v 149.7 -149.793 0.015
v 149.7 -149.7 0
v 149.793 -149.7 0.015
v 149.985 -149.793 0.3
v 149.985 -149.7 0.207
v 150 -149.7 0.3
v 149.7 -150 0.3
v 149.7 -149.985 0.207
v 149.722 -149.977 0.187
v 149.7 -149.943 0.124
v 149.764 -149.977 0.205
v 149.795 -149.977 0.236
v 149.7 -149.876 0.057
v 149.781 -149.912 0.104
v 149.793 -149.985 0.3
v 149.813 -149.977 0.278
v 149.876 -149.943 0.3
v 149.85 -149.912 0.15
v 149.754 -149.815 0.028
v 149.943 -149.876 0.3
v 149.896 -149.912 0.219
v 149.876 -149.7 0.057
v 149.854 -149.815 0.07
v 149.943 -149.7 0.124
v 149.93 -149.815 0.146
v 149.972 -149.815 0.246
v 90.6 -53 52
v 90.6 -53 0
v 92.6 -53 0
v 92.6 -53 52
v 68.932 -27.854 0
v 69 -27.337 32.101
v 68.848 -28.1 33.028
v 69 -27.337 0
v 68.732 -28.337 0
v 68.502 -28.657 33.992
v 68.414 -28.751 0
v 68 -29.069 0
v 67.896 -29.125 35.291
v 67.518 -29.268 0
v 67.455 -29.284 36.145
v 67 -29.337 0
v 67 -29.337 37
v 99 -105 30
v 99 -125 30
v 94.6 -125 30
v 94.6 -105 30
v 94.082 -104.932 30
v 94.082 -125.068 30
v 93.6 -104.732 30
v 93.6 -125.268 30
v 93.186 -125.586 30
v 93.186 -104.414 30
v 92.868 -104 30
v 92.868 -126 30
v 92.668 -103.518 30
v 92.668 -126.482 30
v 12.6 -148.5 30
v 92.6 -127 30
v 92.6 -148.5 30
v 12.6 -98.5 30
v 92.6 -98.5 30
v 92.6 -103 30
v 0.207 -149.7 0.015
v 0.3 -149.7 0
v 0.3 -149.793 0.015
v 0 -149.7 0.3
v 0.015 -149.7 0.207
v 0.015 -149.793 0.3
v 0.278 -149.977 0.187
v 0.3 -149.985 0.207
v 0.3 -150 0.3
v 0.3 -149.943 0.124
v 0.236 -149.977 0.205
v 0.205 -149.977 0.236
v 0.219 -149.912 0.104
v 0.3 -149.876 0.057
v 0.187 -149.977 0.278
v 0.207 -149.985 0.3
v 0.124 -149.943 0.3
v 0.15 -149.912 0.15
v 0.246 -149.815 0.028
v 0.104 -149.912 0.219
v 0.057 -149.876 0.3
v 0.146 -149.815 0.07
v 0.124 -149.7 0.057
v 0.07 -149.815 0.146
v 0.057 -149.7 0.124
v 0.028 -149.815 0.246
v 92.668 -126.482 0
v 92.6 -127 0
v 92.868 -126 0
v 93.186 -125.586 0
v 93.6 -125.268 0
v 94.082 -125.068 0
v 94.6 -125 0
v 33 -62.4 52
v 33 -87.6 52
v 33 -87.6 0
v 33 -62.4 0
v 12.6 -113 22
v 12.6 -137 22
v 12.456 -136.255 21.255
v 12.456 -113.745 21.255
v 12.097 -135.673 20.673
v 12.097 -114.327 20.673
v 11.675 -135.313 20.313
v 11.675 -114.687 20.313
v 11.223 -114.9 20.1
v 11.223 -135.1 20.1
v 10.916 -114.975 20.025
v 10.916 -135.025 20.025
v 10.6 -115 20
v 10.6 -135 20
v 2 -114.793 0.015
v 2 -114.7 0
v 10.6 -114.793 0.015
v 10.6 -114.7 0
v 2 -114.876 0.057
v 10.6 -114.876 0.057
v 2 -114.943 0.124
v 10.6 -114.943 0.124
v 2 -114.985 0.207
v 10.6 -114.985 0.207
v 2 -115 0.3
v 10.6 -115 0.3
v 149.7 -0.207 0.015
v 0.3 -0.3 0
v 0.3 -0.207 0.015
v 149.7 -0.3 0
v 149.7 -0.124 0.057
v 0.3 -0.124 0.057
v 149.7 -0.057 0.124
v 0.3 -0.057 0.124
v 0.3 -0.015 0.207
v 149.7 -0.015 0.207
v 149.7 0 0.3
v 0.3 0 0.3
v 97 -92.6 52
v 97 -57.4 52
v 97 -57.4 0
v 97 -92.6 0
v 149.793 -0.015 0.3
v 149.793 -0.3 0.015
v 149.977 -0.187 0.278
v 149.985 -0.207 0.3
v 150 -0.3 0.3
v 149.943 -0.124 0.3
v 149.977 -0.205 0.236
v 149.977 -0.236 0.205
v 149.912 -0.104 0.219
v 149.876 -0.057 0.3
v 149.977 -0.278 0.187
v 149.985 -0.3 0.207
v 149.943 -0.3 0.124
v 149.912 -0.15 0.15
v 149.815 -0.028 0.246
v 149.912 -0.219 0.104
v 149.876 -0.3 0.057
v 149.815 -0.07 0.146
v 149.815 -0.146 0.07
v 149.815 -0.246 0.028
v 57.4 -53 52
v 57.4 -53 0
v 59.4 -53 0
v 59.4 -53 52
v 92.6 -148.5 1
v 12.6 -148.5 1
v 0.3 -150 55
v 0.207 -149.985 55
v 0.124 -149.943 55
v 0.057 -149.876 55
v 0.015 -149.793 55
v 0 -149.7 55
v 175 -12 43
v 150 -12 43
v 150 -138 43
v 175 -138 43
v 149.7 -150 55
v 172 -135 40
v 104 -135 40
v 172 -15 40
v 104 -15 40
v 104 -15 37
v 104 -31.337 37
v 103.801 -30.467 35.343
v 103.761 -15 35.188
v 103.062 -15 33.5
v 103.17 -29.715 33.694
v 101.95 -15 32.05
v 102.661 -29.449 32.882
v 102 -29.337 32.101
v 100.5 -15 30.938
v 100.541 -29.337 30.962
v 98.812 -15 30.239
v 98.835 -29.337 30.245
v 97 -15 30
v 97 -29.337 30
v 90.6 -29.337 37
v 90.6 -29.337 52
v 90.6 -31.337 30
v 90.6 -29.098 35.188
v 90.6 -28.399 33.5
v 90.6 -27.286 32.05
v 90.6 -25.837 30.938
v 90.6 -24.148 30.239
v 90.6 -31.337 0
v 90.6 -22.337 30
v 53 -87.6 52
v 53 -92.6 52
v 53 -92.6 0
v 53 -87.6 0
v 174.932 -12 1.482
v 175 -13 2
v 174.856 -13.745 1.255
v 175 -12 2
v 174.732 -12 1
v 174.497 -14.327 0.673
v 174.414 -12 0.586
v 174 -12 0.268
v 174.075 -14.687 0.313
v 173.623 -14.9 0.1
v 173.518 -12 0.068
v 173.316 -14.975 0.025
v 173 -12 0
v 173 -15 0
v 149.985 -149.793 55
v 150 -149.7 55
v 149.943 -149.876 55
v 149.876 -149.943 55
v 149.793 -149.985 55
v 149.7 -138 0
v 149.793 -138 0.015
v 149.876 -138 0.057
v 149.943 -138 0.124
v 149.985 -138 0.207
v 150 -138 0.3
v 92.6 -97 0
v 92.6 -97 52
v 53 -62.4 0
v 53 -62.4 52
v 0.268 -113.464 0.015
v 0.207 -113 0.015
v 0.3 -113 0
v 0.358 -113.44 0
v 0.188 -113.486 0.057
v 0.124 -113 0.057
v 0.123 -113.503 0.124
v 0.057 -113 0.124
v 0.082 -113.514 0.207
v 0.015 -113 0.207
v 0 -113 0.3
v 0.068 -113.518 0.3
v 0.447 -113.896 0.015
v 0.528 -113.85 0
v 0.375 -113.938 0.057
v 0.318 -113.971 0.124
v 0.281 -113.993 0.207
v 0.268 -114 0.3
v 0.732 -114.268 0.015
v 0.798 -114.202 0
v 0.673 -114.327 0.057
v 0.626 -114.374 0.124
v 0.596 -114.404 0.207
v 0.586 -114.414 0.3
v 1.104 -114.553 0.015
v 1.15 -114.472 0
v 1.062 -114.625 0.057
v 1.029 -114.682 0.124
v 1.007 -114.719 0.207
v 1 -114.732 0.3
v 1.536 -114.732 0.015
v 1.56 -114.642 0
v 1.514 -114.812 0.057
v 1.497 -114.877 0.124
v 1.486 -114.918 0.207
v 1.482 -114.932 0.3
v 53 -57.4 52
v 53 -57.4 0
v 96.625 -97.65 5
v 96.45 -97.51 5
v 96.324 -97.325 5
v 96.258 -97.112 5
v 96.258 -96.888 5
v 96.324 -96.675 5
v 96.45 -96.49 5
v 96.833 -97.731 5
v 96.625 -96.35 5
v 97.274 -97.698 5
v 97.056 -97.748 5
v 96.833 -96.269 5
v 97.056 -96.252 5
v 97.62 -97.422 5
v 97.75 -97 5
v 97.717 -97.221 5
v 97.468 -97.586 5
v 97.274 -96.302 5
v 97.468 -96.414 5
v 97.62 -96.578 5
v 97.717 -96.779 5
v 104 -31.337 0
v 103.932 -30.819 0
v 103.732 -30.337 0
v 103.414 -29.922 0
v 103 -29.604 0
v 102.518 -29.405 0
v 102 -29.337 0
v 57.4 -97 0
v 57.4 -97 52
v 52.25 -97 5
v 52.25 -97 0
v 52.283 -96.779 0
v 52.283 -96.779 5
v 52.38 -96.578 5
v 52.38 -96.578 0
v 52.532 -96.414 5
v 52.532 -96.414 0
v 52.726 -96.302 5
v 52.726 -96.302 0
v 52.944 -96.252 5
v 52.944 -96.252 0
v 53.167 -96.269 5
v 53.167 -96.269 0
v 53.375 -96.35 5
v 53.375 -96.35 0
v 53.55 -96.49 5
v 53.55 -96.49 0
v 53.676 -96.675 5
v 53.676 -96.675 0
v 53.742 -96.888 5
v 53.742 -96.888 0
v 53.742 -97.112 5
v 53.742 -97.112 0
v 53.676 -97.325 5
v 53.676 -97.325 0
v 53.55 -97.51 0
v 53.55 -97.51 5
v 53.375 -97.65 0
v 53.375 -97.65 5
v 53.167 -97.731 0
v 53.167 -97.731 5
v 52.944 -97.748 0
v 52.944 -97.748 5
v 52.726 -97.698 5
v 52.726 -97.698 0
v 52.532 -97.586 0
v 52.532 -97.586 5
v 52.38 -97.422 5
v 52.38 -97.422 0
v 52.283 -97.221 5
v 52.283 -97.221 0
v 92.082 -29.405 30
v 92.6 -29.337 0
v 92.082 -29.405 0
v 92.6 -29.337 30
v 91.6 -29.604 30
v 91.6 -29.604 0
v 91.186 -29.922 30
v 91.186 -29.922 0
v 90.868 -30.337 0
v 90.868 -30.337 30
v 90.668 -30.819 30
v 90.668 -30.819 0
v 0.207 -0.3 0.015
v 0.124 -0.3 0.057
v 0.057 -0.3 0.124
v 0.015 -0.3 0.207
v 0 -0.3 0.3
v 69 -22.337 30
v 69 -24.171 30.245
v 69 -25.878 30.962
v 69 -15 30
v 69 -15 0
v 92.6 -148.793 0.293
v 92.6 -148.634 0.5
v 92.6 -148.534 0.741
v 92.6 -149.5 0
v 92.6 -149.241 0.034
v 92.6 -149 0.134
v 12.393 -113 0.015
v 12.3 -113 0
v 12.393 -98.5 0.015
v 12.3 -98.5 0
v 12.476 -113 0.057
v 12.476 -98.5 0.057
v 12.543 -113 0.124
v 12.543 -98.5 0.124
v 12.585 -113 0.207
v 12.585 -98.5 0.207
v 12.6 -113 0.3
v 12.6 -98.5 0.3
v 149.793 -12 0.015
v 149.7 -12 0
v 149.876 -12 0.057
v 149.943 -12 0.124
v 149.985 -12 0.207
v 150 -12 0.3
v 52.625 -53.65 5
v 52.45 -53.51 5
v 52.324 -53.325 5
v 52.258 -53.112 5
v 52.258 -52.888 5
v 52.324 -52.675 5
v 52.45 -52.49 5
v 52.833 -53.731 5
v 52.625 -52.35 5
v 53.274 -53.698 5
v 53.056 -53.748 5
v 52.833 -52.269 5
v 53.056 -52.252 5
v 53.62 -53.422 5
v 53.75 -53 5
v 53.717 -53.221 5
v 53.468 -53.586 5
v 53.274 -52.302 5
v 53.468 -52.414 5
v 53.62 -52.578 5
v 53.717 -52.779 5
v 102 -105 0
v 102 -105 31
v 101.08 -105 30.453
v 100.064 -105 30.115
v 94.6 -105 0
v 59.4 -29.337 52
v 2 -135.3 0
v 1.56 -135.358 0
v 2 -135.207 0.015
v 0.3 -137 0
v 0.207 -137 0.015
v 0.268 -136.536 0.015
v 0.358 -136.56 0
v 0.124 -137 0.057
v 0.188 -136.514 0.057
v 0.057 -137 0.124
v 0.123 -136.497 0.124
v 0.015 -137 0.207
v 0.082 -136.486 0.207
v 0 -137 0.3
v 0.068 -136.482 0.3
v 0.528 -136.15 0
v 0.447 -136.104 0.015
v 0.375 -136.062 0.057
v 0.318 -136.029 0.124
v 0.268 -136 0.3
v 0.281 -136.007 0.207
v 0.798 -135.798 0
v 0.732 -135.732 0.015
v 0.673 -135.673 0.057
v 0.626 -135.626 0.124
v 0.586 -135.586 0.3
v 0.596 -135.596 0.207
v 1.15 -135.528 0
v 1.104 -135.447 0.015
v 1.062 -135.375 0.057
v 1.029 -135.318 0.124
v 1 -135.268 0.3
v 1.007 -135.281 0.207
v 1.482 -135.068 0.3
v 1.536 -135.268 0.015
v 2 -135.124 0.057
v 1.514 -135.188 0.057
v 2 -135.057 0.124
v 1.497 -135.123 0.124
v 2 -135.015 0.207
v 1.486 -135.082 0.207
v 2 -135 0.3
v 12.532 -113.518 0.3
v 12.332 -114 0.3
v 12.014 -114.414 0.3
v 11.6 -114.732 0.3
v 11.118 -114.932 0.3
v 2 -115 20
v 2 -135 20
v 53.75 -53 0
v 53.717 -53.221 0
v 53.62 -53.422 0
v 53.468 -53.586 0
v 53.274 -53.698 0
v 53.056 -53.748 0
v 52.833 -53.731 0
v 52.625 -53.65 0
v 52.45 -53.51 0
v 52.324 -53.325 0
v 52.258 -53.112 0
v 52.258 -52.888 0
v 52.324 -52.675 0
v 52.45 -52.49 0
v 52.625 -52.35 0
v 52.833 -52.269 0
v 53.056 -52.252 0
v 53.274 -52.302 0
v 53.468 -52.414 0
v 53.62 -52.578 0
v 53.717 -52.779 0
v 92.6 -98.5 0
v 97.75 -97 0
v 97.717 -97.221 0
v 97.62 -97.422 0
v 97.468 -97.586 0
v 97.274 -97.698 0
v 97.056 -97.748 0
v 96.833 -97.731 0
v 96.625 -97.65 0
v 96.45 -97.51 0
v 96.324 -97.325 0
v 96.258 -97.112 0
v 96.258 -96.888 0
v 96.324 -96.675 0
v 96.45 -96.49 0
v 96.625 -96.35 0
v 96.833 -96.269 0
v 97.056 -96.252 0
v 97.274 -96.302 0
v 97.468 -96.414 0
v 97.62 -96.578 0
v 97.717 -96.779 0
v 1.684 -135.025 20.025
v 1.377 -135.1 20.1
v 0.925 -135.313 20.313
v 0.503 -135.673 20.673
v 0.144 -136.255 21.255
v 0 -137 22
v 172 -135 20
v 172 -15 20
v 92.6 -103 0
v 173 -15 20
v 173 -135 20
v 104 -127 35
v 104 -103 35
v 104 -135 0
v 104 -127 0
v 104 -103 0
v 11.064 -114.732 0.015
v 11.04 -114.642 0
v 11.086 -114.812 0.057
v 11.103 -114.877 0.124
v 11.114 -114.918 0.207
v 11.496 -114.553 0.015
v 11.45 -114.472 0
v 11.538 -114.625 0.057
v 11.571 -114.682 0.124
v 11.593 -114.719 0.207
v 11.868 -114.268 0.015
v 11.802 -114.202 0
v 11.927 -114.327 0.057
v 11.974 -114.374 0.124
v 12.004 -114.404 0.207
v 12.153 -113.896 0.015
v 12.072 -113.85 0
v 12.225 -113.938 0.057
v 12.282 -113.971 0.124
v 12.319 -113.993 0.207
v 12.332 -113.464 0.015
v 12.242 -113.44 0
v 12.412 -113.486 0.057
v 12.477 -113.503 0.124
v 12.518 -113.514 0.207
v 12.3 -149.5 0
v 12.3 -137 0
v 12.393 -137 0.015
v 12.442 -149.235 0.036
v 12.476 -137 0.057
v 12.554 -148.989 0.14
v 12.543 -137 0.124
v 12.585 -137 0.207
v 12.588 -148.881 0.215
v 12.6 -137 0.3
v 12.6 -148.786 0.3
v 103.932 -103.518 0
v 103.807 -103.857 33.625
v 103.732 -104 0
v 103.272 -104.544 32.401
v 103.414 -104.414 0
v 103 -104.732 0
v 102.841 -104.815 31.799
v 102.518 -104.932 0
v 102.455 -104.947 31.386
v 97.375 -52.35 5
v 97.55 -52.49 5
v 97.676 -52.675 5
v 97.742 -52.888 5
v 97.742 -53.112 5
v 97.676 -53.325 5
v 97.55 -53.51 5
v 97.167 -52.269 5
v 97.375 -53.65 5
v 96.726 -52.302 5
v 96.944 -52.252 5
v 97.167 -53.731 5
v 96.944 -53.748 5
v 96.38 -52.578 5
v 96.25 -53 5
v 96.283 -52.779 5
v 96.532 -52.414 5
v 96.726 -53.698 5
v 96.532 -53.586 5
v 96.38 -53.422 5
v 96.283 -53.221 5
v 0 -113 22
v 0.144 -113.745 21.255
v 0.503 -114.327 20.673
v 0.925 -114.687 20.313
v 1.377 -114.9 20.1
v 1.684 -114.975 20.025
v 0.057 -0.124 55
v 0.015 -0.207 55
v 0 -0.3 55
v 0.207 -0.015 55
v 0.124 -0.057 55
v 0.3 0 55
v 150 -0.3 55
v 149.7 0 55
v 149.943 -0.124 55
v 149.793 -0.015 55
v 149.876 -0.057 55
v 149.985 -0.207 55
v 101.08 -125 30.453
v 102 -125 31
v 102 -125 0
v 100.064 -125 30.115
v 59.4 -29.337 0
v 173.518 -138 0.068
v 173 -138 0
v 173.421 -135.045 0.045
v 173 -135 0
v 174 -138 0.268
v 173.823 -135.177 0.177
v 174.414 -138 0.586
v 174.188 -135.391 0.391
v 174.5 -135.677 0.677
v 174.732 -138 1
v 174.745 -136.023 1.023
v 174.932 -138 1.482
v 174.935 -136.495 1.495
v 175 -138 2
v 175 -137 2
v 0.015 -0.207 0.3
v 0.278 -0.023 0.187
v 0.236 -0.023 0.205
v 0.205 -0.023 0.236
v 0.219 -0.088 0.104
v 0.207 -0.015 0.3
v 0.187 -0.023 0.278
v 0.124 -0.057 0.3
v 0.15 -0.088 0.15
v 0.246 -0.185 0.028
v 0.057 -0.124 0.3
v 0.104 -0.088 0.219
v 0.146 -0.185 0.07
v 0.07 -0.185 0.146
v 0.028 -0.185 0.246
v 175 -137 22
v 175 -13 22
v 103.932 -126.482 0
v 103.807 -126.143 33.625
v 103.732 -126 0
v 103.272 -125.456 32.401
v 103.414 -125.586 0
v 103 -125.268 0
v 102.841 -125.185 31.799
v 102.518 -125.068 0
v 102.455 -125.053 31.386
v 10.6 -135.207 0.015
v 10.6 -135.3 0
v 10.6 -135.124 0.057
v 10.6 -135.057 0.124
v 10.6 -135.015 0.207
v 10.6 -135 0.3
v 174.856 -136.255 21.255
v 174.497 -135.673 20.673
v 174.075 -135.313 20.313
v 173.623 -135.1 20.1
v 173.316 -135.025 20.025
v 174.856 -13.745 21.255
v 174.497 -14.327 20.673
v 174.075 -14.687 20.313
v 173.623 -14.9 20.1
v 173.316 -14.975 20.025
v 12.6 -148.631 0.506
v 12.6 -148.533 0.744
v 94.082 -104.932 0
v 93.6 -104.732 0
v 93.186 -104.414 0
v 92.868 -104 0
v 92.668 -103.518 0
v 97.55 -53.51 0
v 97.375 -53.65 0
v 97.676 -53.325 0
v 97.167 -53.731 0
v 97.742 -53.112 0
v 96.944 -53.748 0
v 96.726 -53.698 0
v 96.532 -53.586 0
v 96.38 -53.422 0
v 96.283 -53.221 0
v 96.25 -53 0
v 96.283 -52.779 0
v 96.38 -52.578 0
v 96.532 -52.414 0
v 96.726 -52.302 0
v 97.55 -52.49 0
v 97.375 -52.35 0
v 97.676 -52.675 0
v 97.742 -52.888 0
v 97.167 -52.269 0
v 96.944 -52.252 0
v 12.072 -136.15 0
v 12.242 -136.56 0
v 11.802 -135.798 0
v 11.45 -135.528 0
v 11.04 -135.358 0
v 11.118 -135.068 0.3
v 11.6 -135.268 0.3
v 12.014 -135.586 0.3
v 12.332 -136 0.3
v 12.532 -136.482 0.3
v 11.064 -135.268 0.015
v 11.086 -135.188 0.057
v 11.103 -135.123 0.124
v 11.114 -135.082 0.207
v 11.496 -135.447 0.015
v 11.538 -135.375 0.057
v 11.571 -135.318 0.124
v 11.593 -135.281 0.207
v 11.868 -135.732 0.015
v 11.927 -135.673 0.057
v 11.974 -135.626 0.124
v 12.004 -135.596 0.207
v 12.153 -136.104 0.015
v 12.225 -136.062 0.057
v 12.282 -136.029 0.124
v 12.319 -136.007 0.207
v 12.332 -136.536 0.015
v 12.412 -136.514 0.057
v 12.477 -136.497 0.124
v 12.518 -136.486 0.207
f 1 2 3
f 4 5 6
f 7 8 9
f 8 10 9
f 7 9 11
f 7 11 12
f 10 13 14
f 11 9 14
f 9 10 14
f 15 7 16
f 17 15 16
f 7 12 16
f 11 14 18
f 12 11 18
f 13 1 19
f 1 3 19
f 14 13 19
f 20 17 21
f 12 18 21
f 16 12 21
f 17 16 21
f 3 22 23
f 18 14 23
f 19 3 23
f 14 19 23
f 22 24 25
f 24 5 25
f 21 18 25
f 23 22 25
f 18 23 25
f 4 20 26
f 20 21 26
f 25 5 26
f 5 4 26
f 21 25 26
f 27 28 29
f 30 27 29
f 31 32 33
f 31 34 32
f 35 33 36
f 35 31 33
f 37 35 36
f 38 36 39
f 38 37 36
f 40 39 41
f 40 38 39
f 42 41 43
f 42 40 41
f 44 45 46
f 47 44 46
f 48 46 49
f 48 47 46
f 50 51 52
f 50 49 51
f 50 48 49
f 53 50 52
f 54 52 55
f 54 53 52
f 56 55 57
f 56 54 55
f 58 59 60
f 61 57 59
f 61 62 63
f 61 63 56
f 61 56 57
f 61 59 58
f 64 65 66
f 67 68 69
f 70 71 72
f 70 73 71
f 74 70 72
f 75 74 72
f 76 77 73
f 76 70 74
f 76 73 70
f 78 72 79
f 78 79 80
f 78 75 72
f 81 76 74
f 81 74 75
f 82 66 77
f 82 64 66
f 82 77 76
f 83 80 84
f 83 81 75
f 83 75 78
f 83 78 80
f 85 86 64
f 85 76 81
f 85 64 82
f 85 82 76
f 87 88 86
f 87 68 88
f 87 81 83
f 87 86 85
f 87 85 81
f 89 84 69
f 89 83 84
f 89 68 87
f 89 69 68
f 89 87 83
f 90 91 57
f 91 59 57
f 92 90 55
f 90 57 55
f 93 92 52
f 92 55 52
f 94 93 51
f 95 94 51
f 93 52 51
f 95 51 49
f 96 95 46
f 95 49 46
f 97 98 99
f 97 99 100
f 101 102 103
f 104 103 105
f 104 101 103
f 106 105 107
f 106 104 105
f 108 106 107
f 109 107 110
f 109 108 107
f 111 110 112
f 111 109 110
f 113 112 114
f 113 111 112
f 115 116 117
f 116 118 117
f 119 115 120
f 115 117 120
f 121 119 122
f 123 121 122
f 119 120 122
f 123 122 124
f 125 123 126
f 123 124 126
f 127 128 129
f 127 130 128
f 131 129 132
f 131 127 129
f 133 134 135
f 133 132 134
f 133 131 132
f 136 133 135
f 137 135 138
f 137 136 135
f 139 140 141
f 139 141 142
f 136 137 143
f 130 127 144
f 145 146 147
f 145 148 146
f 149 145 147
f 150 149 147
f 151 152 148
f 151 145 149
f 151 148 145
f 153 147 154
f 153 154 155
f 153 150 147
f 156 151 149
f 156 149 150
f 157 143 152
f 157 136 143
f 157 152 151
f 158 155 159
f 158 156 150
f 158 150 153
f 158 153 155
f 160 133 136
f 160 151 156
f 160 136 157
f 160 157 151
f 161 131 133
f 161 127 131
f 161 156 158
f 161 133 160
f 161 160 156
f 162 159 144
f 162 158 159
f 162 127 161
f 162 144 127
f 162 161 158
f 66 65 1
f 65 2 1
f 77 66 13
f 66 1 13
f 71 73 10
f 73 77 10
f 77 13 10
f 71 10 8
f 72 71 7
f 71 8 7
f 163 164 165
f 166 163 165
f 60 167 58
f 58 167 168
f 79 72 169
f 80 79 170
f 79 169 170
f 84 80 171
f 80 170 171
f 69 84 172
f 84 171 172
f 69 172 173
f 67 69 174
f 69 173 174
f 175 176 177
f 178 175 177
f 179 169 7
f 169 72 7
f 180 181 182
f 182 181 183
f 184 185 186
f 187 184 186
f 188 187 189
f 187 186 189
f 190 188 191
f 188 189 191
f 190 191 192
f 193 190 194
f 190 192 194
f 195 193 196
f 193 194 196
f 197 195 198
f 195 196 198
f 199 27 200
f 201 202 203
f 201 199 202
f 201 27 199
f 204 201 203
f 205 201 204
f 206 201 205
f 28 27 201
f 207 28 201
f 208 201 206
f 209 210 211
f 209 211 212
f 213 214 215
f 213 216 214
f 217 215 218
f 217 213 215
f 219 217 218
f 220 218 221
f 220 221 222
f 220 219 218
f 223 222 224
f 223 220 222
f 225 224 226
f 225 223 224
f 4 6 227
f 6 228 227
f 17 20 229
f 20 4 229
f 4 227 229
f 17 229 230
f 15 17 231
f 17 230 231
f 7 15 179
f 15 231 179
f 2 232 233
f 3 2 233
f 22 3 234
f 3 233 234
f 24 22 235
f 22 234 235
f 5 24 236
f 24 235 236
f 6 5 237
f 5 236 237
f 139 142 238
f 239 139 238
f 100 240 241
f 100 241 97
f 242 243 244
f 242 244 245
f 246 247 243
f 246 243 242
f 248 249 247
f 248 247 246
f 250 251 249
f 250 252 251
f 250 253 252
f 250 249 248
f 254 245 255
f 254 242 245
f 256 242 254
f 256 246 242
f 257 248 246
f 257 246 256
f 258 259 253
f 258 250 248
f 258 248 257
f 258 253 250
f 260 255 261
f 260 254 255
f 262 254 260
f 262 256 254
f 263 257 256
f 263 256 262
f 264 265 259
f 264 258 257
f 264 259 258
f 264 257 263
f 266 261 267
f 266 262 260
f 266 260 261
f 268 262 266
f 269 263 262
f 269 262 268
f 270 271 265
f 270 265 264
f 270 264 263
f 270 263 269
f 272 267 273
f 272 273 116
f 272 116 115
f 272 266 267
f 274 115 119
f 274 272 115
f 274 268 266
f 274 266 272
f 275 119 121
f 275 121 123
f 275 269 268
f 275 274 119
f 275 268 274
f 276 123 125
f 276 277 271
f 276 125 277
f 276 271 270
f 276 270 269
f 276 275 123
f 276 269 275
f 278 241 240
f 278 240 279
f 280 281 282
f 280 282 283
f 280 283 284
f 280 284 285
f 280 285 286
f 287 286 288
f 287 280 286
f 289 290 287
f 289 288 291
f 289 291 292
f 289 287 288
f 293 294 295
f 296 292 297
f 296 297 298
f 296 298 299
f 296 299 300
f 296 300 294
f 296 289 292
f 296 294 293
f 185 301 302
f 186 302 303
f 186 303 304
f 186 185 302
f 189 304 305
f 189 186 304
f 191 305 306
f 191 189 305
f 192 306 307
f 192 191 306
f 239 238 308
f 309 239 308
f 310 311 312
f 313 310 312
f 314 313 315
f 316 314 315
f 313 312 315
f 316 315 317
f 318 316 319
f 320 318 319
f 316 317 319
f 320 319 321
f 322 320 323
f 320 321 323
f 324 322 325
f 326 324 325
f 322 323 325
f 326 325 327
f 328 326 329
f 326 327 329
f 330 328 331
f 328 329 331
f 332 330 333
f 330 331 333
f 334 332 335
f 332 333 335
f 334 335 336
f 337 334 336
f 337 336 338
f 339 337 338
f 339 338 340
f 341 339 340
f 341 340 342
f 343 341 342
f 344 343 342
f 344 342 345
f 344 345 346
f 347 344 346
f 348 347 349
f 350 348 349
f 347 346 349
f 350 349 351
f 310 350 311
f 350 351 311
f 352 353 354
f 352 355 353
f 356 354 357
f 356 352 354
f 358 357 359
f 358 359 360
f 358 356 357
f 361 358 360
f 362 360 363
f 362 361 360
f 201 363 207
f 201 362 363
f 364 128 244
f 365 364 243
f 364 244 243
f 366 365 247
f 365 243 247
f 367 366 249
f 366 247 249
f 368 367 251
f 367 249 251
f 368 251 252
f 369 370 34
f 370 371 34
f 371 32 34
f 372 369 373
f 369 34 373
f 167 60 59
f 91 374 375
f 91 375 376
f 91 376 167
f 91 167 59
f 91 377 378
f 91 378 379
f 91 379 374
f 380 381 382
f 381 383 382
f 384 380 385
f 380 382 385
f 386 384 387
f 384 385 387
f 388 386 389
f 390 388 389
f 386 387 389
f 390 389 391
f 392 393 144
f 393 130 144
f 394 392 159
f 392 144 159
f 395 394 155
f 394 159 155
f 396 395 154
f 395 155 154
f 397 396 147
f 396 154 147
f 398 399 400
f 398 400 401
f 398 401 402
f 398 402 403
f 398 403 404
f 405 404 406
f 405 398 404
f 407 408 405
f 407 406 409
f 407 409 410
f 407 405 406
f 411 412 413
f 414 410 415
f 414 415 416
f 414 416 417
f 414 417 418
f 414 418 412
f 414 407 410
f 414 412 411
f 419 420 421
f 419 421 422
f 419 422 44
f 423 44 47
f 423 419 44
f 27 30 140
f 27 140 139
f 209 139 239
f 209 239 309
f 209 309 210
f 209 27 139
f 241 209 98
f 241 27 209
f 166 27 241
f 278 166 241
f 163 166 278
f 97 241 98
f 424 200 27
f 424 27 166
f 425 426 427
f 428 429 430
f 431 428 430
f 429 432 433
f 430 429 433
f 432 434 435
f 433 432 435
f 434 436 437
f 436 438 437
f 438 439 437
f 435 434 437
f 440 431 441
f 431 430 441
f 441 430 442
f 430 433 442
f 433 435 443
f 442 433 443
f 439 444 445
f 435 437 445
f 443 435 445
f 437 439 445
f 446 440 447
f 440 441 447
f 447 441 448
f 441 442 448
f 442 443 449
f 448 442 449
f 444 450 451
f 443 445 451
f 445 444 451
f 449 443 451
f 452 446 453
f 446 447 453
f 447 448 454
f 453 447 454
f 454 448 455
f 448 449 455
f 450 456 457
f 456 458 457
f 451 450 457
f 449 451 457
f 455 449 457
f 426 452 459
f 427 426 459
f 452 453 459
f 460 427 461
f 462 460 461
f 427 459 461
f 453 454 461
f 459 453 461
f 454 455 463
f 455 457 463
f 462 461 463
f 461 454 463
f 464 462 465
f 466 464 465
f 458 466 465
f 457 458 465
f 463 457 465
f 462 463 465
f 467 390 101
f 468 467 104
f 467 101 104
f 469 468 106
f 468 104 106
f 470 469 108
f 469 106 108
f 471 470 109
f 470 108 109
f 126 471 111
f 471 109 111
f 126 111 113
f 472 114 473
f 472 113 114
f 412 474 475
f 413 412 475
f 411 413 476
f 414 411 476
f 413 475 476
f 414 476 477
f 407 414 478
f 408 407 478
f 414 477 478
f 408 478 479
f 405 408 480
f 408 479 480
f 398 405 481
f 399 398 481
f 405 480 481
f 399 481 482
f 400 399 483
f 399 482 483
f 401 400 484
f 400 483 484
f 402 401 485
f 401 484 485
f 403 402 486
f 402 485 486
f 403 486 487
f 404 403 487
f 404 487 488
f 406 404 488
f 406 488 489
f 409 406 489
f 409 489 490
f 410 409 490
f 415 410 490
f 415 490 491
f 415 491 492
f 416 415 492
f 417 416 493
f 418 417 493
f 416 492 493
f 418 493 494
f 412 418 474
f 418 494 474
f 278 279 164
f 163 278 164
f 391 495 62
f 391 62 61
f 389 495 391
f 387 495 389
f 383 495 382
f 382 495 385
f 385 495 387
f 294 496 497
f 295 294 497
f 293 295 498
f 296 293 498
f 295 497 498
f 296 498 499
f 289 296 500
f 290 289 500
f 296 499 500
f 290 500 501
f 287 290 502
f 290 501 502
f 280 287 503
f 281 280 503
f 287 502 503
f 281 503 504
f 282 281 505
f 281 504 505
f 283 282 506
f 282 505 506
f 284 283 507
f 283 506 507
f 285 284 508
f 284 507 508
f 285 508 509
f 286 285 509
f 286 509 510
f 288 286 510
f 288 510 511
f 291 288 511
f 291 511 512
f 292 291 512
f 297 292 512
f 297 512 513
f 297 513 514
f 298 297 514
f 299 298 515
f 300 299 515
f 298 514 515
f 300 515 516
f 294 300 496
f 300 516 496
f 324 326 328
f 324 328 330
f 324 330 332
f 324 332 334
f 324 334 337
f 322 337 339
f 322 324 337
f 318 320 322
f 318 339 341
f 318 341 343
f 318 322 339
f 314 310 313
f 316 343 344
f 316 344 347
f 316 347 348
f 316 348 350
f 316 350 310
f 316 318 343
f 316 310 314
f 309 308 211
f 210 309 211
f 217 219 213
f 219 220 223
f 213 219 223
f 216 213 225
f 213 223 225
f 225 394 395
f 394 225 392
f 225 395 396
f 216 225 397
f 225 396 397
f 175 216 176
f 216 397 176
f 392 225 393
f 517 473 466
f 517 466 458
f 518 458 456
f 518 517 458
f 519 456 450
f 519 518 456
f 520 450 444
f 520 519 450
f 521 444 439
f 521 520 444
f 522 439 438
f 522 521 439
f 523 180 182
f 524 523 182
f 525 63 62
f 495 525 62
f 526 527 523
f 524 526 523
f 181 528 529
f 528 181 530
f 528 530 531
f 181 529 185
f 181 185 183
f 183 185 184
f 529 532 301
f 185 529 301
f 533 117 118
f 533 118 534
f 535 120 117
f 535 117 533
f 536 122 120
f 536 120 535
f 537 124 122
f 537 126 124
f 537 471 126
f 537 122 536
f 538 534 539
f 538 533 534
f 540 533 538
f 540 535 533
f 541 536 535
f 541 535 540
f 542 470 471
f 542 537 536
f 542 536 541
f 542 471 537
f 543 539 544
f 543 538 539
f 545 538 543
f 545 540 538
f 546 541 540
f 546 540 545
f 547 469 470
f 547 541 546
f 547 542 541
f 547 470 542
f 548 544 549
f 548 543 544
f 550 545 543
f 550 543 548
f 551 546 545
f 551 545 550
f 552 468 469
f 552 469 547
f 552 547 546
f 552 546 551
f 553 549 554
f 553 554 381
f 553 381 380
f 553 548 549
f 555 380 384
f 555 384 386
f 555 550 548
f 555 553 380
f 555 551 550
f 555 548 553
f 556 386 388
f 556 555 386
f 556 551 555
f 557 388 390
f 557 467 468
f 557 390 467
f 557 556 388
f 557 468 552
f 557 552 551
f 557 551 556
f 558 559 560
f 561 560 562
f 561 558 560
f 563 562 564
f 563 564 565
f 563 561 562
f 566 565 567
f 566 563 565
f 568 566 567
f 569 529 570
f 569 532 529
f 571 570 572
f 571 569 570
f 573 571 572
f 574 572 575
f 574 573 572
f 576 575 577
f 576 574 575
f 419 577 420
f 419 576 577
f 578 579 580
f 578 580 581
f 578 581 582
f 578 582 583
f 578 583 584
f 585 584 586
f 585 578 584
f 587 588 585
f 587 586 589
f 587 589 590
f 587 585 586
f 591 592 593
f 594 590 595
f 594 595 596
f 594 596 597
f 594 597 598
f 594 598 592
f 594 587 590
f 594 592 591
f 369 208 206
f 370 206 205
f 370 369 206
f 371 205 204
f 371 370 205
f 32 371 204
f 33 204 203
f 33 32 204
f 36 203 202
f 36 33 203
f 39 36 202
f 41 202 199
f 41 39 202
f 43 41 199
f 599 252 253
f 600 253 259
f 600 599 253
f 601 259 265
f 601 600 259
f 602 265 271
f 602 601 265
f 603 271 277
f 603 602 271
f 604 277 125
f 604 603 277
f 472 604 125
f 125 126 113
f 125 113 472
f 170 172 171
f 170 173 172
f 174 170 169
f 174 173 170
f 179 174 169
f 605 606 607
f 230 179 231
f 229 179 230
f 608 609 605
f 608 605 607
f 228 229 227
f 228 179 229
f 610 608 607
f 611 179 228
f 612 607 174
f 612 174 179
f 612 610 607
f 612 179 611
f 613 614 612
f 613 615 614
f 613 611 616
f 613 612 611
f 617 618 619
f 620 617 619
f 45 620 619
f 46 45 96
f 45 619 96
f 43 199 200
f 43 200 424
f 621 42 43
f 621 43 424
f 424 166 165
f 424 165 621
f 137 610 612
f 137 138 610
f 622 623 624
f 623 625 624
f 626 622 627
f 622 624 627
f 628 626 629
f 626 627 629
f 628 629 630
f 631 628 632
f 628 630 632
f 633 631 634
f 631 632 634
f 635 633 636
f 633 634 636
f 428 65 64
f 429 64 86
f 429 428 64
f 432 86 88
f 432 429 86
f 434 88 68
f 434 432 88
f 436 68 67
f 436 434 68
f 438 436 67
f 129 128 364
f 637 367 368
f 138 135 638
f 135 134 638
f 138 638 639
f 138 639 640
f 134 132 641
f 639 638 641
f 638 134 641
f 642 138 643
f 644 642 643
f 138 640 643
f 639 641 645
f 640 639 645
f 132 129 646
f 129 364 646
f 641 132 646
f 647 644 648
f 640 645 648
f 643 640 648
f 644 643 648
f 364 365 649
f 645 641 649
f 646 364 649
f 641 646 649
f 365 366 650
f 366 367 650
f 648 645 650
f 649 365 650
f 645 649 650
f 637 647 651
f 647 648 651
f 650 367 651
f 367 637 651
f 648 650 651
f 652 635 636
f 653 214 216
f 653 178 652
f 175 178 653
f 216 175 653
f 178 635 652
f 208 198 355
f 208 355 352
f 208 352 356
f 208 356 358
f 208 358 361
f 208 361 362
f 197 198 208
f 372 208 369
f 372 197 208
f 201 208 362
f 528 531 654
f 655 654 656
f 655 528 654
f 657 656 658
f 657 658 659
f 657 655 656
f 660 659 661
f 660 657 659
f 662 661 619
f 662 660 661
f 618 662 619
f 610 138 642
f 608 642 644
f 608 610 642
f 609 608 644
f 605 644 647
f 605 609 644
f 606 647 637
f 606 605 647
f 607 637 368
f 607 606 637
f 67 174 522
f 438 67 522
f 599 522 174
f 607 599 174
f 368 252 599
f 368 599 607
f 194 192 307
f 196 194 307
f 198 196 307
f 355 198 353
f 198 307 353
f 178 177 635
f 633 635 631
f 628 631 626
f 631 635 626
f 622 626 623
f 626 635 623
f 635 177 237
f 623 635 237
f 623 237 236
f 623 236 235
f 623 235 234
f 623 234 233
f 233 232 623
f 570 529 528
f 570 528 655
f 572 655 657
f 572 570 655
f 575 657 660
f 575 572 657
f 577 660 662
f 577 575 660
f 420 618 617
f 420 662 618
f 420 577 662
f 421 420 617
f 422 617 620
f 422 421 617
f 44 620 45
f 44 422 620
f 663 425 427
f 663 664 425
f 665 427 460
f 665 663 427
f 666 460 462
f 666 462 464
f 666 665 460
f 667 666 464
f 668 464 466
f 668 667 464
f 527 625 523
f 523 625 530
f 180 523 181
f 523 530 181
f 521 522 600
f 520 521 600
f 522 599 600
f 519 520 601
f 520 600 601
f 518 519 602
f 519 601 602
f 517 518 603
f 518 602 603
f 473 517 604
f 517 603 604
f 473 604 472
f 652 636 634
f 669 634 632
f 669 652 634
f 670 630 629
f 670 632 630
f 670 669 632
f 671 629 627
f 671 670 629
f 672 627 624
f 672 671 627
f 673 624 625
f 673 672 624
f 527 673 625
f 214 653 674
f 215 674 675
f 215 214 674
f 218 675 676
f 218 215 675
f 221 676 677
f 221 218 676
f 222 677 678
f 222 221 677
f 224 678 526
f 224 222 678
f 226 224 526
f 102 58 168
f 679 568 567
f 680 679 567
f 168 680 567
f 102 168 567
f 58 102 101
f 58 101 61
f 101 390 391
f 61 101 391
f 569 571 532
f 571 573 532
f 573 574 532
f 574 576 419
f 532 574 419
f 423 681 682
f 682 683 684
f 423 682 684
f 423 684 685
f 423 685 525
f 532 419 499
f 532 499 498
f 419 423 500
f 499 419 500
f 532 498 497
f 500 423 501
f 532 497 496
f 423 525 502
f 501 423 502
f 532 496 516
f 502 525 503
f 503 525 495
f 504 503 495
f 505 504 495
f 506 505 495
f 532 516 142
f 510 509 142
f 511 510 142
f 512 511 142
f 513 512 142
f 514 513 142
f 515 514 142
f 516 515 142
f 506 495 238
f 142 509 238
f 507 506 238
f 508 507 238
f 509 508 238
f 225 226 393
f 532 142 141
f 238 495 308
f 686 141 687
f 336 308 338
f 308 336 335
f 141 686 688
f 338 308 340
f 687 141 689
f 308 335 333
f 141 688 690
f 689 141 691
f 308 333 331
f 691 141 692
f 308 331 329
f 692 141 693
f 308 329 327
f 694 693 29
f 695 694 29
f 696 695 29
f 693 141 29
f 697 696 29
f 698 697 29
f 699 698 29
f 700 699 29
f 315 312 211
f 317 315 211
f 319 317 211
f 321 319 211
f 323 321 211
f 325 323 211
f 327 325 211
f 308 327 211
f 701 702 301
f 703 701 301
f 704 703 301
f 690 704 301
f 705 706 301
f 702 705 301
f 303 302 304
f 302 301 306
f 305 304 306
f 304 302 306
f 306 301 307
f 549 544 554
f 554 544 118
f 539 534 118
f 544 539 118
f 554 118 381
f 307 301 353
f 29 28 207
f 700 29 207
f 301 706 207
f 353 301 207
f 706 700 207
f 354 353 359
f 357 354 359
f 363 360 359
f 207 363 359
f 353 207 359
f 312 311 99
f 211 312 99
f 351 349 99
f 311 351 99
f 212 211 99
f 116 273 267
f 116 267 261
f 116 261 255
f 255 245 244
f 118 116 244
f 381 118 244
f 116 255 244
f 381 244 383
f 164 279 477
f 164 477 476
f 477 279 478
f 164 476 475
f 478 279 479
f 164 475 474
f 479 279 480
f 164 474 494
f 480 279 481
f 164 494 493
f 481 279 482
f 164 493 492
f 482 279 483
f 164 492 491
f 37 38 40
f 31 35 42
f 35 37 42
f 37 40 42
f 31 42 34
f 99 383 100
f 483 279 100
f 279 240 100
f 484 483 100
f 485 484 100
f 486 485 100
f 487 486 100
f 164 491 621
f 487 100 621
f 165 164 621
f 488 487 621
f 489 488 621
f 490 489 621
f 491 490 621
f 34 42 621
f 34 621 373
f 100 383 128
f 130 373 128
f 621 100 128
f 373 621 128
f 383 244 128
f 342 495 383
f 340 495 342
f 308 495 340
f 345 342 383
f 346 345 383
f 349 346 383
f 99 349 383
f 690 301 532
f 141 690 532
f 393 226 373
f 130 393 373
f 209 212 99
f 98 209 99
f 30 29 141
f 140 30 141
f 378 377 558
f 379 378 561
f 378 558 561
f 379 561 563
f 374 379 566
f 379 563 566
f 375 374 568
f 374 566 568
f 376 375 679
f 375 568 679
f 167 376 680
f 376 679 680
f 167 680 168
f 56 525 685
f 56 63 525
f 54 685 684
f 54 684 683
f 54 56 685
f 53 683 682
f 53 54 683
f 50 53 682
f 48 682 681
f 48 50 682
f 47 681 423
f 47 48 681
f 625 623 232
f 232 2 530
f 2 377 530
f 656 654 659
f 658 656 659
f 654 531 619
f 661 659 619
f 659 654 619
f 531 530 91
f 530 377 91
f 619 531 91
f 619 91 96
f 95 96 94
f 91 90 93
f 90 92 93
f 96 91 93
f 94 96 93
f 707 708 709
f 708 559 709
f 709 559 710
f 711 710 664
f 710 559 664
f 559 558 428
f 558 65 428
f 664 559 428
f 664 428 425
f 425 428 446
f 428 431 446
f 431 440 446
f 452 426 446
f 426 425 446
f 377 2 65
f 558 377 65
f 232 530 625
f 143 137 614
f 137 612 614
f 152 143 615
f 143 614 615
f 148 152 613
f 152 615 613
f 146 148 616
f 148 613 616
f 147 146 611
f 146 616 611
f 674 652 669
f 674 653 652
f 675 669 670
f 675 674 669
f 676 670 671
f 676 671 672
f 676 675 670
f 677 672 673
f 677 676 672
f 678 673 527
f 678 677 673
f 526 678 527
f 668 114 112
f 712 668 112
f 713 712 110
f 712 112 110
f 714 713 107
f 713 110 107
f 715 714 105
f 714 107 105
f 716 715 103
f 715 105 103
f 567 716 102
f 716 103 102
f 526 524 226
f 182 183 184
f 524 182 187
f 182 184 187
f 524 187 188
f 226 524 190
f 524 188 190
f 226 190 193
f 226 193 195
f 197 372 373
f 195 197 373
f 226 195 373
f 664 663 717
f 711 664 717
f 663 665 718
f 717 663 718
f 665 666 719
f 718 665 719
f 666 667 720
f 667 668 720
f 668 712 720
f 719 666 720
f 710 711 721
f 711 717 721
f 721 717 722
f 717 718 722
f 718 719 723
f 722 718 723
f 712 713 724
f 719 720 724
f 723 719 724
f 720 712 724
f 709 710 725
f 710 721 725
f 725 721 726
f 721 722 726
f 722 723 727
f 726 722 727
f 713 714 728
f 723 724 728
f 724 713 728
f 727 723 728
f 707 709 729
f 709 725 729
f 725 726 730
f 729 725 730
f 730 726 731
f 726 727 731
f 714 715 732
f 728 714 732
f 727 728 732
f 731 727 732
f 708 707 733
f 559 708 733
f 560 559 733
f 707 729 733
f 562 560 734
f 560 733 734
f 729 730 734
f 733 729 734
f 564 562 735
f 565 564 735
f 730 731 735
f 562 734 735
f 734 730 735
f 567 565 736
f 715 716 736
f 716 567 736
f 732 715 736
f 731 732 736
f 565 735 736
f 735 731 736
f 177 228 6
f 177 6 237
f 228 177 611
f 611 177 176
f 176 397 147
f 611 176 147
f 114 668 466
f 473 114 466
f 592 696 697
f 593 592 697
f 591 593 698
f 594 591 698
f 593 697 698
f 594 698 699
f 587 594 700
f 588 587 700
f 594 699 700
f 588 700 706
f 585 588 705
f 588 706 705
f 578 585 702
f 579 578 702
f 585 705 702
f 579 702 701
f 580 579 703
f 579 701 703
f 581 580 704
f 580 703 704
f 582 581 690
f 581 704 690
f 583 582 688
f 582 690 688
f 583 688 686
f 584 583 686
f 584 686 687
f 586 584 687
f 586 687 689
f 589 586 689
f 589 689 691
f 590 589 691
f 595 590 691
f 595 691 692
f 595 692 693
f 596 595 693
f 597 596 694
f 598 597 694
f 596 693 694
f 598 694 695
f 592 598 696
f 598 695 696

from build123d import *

# Parameters (mm, degrees)
SKETCH_1_W           = 150
SKETCH_1_H           = 150
EXTRUDE_2_DEPTH      = 55
CUT_EXTRUDE_1_DEPTH  = 52
SKETCH_3_W           = 20
SKETCH_3_H           = 25.2
CUT_EXTRUDE_2_DEPTH  = 52
SKETCH_4_W           = 31.2
SKETCH_4_H           = 23.663491794
CUT_EXTRUDE_3_DEPTH  = 52
SKETCH_5_W           = 46
SKETCH_5_H           = 120
SKETCH_5_W_2         = 29
CUT_EXTRUDE_4_DEPTH  = 40
SKETCH_6_W           = 3
SKETCH_6_H           = 120
EXTRUDE_4_DEPTH      = 25
SKETCH_7_W           = 3
SKETCH_7_H           = 120
EXTRUDE_5_DEPTH      = 20
CUT_EXTRUDE_6_DEPTH  = 30
FILLET_1_R           = 7
SKETCH_10_W          = 80
SKETCH_10_H          = 50
CUT_EXTRUDE_7_DEPTH  = 30
SKETCH_11_W          = 11.4
SKETCH_11_H          = 20
CUT_EXTRUDE_8_DEPTH  = 30
FILLET_2_R           = 5
FILLET_3_R           = 2
SKETCH_12_W          = 12.6
SKETCH_12_H          = 20
CUT_EXTRUDE_9_DEPTH  = 20
FILLET_4_R           = 2
SKETCH_13_R          = 0.75
CUT_EXTRUDE_10_DEPTH = 5
FILLET_5_R           = 2
FILLET_6_R           = 1
FILLET_8_R           = 0.3


with BuildPart() as part:
    # 草图1 → 凸台-拉伸2 (new body)
    with BuildSketch(Plane.XY):
        with Locations((75, -75)):
            Rectangle(SKETCH_1_W, SKETCH_1_H)
    extrude(amount=EXTRUDE_2_DEPTH)

    # 草图2 → 切除-拉伸1 (cut)
    with BuildSketch(Plane(origin=(0, 0, 0), x_dir=(-1, 0, 0), z_dir=(0, 0, -1))):
        Polygon((-57.4, -53), (-92.6, -53), (-97, -57.4), (-97, -92.6), (-92.6, -97), (-57.4, -97), (-53, -92.6), (-53, -57.4), align=None)
    extrude(amount=-CUT_EXTRUDE_1_DEPTH, mode=Mode.SUBTRACT)

    # 草图3 → 切除-拉伸2 (cut)
    with BuildSketch(Plane(origin=(0, 0, 0), x_dir=(-1, 0, 0), z_dir=(0, 0, -1))):
        with Locations((-43, -75)):
            Rectangle(SKETCH_3_W, SKETCH_3_H)
    extrude(amount=-CUT_EXTRUDE_2_DEPTH, mode=Mode.SUBTRACT)

    # 草图4 → 切除-拉伸3 (cut)
    with BuildSketch(Plane(origin=(0, 0, 0), x_dir=(-1, 0, 0), z_dir=(0, 0, -1))):
        with Locations((-75, -41.168254103)):
            Rectangle(SKETCH_4_W, SKETCH_4_H)
    extrude(amount=-CUT_EXTRUDE_3_DEPTH, mode=Mode.SUBTRACT)

    # 草图5 → 切除-拉伸4 (cut)
    with BuildSketch(Plane(origin=(0, 0, 0), x_dir=(-1, 0, 0), z_dir=(0, 0, -1))):
        with Locations((-127, -75)):
            Rectangle(SKETCH_5_W, SKETCH_5_H)
        with Locations((-164.5, -75)):
            Rectangle(SKETCH_5_W_2, SKETCH_5_H)
    extrude(amount=-CUT_EXTRUDE_4_DEPTH, mode=Mode.SUBTRACT)

    # 草图6 → 凸台-拉伸4 (add)
    with BuildSketch(Plane(origin=(150, 0, 0), x_dir=(0, 0, -1), z_dir=(1, 0, 0))):
        Polygon((-43, -15), (-40, -15), (0, -15), (0, -12), (-43, -12), align=None)
        with Locations((-41.5, -75)):
            Rectangle(SKETCH_6_W, SKETCH_6_H)
        Polygon((0, -135), (-40, -135), (-43, -135), (-43, -138), (0, -138), align=None)
    extrude(amount=EXTRUDE_4_DEPTH)

    # 草图7 → 凸台-拉伸5 (add)
    with BuildSketch(Plane(origin=(0, 0, 40), x_dir=(-1, 0, 0), z_dir=(0, 0, -1))):
        with Locations((-173.5, -75)):
            Rectangle(SKETCH_7_W, SKETCH_7_H)
    extrude(amount=EXTRUDE_5_DEPTH)

    # 草图8 → 切除-拉伸6 (cut)
    with BuildSketch(Plane(origin=(0, 0, 0), x_dir=(-1, 0, 0), z_dir=(0, 0, -1))):
        Polygon((-69, -15), (-104, -15), (-104, -29.336508206), (-90.6, -29.336508206), (-69, -29.336508206), align=None)
    extrude(amount=-CUT_EXTRUDE_6_DEPTH, mode=Mode.SUBTRACT)

    # 圆角1
    fillet_1_edges = [part.edges().sort_by_distance(p)[0] for p in [
        (104, -22.168254103, 30),
        (79.8, -29.336508206, 30),
    ]]
    fillet(fillet_1_edges, radius=FILLET_1_R)

    # 草图10 → 切除-拉伸7 (cut)
    with BuildSketch(Plane(origin=(0, 0, 0), x_dir=(-1, 0, 0), z_dir=(0, 0, -1))):
        with Locations((-52.6, -123.5)):
            Rectangle(SKETCH_10_W, SKETCH_10_H)
    extrude(amount=-CUT_EXTRUDE_7_DEPTH, mode=Mode.SUBTRACT)

    # 草图11 → 切除-拉伸8 (cut)
    with BuildSketch(Plane(origin=(0, 0, 0), x_dir=(-1, 0, 0), z_dir=(0, 0, -1))):
        with Locations((-98.3, -115)):
            Rectangle(SKETCH_11_W, SKETCH_11_H)
    extrude(amount=-CUT_EXTRUDE_8_DEPTH, mode=Mode.SUBTRACT)

    # 圆角2
    fillet_2_edges = [part.edges().sort_by_distance(p)[0] for p in [
        (104, -115, 30),
    ]]
    fillet(fillet_2_edges, radius=FILLET_2_R)

    # 圆角3
    fillet_3_edges = [part.edges().sort_by_distance(p)[0] for p in [
        (90.6, -29.336508206, 15),
        (69, -29.336508206, 18.5),
        (104, -29.336508206, 18.5),
        (104, -125, 17.5),
        (104, -105, 17.5),
        (92.6, -105, 15),
        (92.6, -125, 15),
    ]]
    fillet(fillet_3_edges, radius=FILLET_3_R)

    # 草图12 → 切除-拉伸9 (cut)
    with BuildSketch(Plane(origin=(0, 0, 0), x_dir=(-1, 0, 0), z_dir=(0, 0, -1))):
        with Locations((-6.3, -125)):
            Rectangle(SKETCH_12_W, SKETCH_12_H)
    extrude(amount=-CUT_EXTRUDE_9_DEPTH, mode=Mode.SUBTRACT)

    # 圆角4
    fillet_4_edges = [part.edges().sort_by_distance(p)[0] for p in [
        (12.6, -125, 20),
        (12.6, -135, 10),
        (12.6, -115, 10),
        (0, -125, 20),
        (0, -115, 10),
        (0, -135, 10),
    ]]
    fillet(fillet_4_edges, radius=FILLET_4_R)

    # 草图13 → 切除-拉伸10 (cut)
    with BuildSketch(Plane(origin=(0, 0, 0), x_dir=(-1, 0, 0), z_dir=(0, 0, -1))):
        with Locations((-97, -53)):
            Circle(SKETCH_13_R)
        with Locations(Location((-97, -97, 0), (0, 0, 180))):
            Circle(SKETCH_13_R)
        with Locations((-53, -97)):
            Circle(SKETCH_13_R)
        with Locations(Location((-53, -53, 0), (0, 0, 180))):
            Circle(SKETCH_13_R)
    extrude(amount=-CUT_EXTRUDE_10_DEPTH, mode=Mode.SUBTRACT)

    # 圆角5
    fillet_5_edges = [part.edges().sort_by_distance(p)[0] for p in [
        (175, -13.5, 0),
        (175, -75, 20),
        (175, -15, 10),
        (175, -136.5, 0),
        (175, -135, 10),
    ]]
    fillet(fillet_5_edges, radius=FILLET_5_R)

    # 圆角6
    fillet_6_edges = [part.edges().sort_by_distance(p)[0] for p in [
        (52.6, -148.5, 0),
    ]]
    fillet(fillet_6_edges, radius=FILLET_6_R)

    # 圆角8
    fillet_8_edges = [part.edges().sort_by_distance(p)[0] for p in [
        (12.6, -105.75, 0),
        (0, -143.5, 0),
        (6.3, -135, 0),
        (12.6, -143.25, 0),
        (12.014213562, -135.585786438, 0),
        (0.585786438, -135.585786438, 0),
        (6.3, -115, 0),
        (0.585786438, -114.414213562, 0),
        (12.014213562, -114.414213562, 0),
        (75, 0, 0),
        (150, -144, 0),
        (75, -150, 0),
        (0, -56.5, 0),
        (0, 0, 27.5),
        (150, 0, 27.5),
        (150, -150, 27.5),
        (0, -150, 27.5),
        (150, -6, 0),
    ]]
    fillet(fillet_8_edges, radius=FILLET_8_R)


solid = part.part
